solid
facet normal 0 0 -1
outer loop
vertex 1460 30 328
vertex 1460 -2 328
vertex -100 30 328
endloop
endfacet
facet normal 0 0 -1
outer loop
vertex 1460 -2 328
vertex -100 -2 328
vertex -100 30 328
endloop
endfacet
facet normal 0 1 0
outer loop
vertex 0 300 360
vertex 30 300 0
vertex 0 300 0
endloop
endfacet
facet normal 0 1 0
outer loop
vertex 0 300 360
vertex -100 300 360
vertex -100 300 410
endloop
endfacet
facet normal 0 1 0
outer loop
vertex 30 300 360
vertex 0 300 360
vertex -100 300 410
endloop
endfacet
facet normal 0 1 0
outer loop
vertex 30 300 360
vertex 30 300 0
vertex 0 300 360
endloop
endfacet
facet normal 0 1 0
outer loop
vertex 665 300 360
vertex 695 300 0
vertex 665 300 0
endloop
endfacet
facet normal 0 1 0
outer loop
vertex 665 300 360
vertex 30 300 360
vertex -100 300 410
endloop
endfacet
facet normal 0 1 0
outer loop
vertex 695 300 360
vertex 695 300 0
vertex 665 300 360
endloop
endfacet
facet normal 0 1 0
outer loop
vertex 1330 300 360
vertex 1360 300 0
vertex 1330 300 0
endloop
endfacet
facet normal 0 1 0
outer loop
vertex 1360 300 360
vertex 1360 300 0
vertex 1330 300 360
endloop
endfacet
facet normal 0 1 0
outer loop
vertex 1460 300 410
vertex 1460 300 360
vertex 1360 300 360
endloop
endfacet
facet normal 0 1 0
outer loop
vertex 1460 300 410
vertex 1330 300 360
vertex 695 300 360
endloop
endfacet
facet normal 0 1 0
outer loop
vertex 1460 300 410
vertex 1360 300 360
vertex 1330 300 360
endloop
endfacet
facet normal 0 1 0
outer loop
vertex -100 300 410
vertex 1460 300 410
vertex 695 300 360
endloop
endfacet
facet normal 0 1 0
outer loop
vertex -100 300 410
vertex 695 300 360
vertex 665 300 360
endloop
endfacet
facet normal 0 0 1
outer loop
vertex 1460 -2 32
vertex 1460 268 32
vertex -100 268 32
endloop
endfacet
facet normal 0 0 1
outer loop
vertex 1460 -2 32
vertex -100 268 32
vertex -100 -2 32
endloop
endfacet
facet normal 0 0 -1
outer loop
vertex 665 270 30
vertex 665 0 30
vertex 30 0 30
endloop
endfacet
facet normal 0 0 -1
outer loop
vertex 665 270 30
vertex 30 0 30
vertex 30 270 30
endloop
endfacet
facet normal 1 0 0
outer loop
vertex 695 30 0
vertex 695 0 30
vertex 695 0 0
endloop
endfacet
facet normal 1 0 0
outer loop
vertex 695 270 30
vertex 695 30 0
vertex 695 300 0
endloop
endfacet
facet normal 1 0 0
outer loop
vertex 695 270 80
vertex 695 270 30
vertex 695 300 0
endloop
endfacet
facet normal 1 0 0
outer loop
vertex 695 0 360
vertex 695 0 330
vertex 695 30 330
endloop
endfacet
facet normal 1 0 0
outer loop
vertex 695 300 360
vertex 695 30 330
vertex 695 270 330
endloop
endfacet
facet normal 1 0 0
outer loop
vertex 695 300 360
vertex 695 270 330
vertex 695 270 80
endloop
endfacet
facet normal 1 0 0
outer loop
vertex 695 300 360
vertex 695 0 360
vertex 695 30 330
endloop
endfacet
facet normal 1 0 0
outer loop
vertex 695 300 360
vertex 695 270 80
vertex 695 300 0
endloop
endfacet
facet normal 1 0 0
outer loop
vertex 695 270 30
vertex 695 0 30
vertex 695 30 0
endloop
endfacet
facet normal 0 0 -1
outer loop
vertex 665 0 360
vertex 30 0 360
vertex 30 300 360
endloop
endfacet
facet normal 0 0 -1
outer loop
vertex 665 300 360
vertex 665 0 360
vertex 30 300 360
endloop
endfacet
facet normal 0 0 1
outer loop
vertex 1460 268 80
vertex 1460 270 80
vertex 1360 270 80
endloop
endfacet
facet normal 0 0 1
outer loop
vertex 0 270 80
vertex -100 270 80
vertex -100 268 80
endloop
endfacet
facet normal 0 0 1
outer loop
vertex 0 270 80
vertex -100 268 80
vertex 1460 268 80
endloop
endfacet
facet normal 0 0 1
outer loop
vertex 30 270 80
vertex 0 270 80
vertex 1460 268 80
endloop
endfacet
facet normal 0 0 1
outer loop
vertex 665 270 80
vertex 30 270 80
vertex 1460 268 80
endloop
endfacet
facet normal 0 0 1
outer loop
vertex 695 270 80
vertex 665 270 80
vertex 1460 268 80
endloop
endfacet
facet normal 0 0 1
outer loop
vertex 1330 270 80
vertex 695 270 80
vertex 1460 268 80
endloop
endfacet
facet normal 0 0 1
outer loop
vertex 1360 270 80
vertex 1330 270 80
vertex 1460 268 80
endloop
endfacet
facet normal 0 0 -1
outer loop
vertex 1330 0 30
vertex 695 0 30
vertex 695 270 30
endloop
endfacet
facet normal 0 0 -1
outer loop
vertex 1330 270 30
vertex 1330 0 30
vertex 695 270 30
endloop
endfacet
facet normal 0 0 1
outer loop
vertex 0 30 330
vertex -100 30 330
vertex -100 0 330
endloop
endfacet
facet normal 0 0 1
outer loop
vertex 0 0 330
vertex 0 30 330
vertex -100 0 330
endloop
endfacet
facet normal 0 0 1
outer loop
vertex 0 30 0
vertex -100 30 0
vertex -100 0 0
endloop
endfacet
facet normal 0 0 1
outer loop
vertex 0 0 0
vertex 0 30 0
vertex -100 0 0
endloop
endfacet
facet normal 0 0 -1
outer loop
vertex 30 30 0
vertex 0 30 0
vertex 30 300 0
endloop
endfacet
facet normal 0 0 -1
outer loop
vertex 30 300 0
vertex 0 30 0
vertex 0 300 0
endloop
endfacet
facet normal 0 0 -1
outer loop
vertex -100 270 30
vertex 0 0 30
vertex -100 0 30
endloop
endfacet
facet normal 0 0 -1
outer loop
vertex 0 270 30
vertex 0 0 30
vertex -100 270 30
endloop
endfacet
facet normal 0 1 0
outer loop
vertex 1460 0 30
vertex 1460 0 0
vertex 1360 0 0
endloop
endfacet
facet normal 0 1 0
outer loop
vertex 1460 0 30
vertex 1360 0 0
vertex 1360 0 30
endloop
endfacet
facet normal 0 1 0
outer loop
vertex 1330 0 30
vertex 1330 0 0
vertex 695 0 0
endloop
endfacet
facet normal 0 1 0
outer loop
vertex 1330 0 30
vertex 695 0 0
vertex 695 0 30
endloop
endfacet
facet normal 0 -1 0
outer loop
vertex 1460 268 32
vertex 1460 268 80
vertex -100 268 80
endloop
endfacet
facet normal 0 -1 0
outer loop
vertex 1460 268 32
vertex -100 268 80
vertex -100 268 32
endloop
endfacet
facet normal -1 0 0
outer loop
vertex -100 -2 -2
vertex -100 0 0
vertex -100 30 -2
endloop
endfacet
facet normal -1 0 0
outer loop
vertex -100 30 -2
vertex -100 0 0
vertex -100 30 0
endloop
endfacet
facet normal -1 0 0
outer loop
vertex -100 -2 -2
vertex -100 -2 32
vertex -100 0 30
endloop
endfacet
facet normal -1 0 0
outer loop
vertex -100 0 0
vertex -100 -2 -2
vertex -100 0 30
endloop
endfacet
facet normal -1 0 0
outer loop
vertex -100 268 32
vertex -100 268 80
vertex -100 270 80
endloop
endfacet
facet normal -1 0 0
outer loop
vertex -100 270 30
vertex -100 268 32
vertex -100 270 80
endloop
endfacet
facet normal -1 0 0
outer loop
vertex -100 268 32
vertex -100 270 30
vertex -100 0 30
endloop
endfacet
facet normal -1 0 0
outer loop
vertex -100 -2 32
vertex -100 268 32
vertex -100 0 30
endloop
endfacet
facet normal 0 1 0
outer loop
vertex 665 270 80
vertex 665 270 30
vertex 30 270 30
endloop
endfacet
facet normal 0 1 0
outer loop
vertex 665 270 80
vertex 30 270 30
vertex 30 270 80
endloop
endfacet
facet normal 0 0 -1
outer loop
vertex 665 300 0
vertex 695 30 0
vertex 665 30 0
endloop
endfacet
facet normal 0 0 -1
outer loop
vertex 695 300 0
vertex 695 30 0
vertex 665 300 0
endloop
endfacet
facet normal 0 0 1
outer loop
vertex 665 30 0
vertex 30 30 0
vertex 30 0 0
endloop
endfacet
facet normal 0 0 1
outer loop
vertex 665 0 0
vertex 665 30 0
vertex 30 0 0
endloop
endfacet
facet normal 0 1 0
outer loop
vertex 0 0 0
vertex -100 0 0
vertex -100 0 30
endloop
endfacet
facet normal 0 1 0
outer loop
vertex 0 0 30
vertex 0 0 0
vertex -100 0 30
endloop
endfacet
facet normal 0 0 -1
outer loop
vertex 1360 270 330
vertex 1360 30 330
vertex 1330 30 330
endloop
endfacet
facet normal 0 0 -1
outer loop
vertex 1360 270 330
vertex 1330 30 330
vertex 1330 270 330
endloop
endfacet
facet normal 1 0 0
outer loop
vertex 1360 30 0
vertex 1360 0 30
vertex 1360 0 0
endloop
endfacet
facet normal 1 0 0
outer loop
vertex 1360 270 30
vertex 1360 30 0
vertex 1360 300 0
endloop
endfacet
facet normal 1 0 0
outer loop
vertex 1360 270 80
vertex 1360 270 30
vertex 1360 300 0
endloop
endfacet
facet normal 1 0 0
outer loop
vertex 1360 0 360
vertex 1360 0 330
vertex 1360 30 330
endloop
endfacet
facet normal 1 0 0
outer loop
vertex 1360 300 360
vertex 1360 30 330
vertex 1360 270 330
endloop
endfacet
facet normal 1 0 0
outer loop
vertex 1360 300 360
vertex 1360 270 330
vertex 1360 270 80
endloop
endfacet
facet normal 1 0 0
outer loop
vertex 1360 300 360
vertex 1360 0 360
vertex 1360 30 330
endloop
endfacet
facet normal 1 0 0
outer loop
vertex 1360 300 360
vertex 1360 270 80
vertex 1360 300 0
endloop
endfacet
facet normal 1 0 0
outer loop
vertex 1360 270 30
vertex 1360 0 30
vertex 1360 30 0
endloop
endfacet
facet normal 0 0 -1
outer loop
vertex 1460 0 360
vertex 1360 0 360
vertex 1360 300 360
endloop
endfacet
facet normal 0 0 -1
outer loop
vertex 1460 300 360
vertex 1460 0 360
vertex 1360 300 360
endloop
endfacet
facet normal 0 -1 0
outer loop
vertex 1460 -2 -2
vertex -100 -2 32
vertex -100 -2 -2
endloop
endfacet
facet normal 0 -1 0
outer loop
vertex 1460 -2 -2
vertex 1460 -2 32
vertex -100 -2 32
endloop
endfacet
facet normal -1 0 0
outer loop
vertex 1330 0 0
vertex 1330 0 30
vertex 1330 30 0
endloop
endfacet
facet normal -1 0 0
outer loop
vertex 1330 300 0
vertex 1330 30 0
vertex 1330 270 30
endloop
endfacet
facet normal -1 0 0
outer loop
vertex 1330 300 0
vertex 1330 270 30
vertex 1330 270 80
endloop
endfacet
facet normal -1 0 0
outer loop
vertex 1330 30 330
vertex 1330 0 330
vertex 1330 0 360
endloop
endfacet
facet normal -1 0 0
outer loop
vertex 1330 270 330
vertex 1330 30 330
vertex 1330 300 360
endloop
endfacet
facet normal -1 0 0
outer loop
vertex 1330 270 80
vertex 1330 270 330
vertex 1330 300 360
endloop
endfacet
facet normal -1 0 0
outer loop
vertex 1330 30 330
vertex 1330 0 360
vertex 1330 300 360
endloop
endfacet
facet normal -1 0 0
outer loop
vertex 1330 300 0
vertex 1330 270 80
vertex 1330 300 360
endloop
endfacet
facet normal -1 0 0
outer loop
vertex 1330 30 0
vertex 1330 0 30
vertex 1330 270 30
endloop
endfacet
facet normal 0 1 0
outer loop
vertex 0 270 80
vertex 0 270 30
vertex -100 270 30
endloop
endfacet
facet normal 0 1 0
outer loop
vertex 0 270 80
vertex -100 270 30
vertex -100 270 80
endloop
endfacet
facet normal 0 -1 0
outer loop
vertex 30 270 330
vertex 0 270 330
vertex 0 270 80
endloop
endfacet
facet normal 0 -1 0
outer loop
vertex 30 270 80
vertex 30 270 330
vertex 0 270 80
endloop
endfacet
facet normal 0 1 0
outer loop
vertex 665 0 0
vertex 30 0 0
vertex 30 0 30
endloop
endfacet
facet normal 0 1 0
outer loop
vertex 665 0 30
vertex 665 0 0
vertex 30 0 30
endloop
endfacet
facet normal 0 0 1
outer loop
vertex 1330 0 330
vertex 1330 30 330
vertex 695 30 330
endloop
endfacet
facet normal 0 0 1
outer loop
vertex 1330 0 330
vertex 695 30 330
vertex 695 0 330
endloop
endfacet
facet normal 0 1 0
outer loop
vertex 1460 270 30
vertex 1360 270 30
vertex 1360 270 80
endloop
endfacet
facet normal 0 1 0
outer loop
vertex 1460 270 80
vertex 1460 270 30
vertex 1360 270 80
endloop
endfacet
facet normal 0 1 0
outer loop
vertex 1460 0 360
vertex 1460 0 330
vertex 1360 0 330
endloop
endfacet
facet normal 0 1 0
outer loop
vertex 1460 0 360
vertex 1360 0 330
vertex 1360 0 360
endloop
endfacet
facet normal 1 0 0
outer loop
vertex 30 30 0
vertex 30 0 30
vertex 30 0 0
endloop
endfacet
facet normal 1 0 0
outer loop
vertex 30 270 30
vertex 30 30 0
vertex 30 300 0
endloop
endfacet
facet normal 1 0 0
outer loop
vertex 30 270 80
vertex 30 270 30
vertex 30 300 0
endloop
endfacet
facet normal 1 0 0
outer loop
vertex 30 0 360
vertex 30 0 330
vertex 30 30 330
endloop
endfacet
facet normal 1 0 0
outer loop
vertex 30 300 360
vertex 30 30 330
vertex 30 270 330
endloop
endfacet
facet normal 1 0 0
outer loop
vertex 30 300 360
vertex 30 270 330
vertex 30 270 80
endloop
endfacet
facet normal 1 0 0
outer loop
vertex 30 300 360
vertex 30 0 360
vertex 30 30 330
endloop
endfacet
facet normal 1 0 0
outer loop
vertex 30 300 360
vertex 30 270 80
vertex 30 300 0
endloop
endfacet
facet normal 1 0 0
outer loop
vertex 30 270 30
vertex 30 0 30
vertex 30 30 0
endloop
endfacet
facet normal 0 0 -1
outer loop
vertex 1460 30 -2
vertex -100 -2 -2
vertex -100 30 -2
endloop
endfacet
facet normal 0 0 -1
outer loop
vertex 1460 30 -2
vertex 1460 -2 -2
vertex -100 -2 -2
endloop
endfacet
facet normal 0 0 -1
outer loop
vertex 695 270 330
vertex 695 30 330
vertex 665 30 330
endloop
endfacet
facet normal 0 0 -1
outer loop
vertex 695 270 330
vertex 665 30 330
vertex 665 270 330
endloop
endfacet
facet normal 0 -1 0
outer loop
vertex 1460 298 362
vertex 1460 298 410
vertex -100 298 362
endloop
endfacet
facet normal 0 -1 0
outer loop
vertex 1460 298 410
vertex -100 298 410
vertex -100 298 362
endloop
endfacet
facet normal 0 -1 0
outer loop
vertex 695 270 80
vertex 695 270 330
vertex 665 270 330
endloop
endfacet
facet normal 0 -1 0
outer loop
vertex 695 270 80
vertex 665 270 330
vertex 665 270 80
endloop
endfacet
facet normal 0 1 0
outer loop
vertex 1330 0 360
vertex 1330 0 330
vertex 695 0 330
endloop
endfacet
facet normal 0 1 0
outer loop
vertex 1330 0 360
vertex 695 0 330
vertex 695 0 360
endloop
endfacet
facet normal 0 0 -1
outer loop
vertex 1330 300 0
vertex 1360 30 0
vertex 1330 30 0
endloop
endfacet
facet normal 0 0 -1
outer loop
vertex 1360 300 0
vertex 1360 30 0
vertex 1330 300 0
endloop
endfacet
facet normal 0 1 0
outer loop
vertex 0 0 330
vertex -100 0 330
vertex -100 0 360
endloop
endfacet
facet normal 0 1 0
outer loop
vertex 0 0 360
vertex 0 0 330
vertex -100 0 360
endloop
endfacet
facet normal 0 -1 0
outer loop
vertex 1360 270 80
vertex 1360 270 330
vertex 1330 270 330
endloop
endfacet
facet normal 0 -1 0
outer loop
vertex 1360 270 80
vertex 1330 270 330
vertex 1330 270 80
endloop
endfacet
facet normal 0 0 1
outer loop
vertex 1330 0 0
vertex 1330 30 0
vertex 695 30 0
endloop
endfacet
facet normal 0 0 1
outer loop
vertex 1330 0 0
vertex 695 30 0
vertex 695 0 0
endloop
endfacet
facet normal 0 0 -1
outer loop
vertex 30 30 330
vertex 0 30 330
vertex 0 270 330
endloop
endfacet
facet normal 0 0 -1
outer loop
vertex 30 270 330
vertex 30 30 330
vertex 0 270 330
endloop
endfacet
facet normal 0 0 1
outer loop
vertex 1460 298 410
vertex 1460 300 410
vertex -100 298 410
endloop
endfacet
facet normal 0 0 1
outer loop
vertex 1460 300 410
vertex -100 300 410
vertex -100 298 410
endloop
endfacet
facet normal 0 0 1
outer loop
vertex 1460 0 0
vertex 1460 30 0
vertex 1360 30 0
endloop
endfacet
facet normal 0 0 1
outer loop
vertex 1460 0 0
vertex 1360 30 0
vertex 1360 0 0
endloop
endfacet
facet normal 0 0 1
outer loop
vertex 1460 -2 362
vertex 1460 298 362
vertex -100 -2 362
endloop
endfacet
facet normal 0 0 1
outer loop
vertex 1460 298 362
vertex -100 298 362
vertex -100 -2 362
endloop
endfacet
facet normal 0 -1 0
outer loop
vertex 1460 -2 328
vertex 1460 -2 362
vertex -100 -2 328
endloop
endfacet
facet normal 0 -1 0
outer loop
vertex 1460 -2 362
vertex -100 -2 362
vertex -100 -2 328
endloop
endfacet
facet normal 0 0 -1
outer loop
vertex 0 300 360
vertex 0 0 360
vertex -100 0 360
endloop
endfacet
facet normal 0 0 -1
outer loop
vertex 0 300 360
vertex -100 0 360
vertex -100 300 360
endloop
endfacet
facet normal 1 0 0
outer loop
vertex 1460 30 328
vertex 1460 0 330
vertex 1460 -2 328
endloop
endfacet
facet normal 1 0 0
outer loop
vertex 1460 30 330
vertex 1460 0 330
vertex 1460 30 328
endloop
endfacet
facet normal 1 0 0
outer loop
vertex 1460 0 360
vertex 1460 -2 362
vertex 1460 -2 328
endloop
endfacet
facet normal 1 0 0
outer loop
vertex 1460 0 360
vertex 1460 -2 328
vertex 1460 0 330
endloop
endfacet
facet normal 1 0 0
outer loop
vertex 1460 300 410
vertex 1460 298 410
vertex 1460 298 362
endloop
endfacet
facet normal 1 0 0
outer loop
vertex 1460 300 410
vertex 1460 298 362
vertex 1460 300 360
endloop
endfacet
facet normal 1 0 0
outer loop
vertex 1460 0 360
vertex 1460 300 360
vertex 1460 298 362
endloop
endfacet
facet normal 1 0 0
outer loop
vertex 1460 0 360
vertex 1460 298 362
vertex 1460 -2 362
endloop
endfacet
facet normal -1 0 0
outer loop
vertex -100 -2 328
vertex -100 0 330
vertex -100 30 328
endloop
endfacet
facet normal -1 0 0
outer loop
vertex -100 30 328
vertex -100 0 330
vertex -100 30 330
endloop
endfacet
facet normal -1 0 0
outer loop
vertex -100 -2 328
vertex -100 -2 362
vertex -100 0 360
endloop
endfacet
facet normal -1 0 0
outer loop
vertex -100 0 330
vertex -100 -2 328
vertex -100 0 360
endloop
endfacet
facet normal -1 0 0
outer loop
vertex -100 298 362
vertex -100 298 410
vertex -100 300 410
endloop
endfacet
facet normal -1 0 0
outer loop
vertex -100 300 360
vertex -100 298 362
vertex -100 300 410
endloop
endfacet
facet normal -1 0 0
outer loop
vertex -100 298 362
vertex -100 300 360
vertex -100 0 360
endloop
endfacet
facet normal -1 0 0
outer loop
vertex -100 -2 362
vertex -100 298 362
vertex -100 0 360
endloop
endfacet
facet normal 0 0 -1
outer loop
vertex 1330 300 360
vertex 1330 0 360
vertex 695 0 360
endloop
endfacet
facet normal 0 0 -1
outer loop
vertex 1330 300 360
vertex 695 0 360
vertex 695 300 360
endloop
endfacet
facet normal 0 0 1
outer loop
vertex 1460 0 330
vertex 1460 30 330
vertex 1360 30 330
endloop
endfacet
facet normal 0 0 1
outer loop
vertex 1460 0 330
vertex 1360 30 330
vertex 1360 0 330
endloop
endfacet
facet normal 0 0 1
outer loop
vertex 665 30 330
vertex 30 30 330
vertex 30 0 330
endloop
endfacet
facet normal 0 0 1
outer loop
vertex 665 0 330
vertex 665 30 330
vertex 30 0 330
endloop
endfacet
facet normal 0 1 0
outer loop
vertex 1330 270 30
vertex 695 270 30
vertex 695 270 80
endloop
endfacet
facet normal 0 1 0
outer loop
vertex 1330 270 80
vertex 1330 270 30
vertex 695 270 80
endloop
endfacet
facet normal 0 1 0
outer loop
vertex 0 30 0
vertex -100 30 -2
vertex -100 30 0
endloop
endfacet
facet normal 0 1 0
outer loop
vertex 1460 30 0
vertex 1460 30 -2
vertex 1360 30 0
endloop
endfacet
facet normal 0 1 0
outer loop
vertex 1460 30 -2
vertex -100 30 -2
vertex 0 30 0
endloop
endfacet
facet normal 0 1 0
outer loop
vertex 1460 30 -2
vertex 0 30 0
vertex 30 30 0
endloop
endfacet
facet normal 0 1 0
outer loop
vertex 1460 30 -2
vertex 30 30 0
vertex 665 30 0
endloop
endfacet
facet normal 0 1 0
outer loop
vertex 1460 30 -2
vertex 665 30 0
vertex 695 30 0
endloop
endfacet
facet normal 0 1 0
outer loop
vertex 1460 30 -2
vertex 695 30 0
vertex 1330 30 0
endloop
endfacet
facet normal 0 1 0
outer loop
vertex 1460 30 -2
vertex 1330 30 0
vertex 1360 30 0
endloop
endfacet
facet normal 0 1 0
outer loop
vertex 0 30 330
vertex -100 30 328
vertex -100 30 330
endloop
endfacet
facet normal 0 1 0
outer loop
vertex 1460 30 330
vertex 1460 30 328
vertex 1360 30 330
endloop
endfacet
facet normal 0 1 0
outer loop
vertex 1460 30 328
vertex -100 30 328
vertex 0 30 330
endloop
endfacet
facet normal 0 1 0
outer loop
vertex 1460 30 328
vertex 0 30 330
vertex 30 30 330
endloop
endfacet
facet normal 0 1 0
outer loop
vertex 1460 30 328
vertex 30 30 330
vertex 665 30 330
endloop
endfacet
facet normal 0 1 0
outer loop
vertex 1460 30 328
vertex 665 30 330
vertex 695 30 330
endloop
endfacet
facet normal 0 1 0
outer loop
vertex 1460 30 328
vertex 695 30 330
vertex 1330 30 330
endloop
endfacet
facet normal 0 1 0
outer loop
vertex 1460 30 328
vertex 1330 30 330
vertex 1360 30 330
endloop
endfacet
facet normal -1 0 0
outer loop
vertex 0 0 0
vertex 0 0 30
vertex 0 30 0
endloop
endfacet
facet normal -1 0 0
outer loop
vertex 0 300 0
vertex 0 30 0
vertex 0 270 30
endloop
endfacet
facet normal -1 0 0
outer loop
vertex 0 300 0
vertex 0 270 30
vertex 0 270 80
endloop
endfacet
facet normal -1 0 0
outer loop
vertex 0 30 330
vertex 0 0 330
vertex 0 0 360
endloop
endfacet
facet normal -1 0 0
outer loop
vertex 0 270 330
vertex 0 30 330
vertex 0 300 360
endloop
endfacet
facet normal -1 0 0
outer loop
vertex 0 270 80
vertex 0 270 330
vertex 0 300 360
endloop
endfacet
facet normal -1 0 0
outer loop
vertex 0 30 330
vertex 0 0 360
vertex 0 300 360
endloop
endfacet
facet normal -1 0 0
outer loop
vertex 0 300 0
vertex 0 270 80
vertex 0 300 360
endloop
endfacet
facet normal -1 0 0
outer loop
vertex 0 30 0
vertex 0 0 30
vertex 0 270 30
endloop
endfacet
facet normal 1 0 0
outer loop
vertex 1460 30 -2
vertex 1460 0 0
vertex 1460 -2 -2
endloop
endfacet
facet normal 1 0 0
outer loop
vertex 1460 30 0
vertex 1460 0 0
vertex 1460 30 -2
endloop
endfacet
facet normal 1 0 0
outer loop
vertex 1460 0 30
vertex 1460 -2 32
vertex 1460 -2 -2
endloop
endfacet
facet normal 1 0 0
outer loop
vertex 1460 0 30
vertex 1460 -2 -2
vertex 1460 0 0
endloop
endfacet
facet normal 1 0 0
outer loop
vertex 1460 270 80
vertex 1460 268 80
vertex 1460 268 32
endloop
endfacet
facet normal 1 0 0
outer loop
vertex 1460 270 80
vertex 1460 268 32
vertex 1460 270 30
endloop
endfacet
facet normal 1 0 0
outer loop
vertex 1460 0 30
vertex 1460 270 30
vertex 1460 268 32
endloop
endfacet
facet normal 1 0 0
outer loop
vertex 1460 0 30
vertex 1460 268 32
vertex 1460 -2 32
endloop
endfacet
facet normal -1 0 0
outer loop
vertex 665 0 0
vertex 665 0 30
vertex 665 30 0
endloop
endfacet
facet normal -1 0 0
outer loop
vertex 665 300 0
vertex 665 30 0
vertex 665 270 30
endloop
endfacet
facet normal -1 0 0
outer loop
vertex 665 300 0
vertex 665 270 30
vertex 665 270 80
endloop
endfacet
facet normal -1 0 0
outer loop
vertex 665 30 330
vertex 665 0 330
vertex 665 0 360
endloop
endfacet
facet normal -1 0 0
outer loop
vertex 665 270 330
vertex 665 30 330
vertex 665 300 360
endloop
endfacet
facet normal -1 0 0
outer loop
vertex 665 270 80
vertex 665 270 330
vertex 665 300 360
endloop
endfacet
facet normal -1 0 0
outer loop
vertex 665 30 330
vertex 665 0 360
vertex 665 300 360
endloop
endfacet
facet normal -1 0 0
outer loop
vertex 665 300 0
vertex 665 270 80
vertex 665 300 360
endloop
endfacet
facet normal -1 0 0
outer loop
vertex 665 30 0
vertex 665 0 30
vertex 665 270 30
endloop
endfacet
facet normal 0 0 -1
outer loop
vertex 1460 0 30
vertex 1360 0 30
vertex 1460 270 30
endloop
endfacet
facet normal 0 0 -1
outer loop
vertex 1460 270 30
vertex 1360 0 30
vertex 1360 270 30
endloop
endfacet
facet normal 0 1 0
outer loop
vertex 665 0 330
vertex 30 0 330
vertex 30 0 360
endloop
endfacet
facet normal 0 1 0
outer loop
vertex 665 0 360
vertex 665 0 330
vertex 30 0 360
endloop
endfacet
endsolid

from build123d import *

# Parameters (mm, degrees)
F1_DEPTH      = 30
F5_DEPTH      = 30
F7_DEPTH      = 15
F7_DEPTH_BACK = 15
F9_DEPTH      = 780
F9_DEPTH_BACK = 780


with BuildPart() as f1:
    # F0 (on Right) → F1 (new body)
    with BuildSketch(Plane.YZ):
        Polygon((0, 30), (0, 0), (300, 0), (300, 360), (0, 360), (0, 330), (270, 330), (270, 30), align=None)
    extrude(amount=F1_DEPTH)



with BuildPart() as f5:
    # F4 (on offset) → F5 (new body)
    with BuildSketch(Plane.YZ.offset(1360)):
        Polygon((0, 30), (0, 0), (300, 0), (300, 360), (0, 360), (0, 330), (270, 330), (270, 30), align=None)
    extrude(amount=-F5_DEPTH)


with BuildPart() as f7:
    # F6 (on mid) → F7 (new body, two sides)
    with BuildSketch(Plane.YZ.offset(680)) as f7_sk:
        Polygon((0, 30), (0, 0), (300, 0), (300, 360), (0, 360), (0, 330), (270, 330), (270, 30), align=None)
    extrude(amount=F7_DEPTH)
    extrude(f7_sk.sketch, amount=-F7_DEPTH_BACK)


with BuildPart() as f1_1:
    add(f1.part)

    add(f5.part)  # F9 merges F5

    add(f7.part)  # F9 merges F7
    # F8 (on mid) → F9 (join, two sides)
    with BuildSketch(Plane.YZ.offset(680)) as f9_sk:
        Polygon((30, 0), (0, 0), (0, 30), (270, 30), (270, 80), (268, 80), (268, 32), (-2, 32), (-2, -2), (30, -2), align=None)
        Polygon((30, 330), (0, 330), (0, 360), (300, 360), (300, 410), (298, 410), (298, 362), (-2, 362), (-2, 328), (30, 328), align=None)
    extrude(amount=F9_DEPTH)
    extrude(f9_sk.sketch, amount=-F9_DEPTH_BACK)


solid = f1_1.part
